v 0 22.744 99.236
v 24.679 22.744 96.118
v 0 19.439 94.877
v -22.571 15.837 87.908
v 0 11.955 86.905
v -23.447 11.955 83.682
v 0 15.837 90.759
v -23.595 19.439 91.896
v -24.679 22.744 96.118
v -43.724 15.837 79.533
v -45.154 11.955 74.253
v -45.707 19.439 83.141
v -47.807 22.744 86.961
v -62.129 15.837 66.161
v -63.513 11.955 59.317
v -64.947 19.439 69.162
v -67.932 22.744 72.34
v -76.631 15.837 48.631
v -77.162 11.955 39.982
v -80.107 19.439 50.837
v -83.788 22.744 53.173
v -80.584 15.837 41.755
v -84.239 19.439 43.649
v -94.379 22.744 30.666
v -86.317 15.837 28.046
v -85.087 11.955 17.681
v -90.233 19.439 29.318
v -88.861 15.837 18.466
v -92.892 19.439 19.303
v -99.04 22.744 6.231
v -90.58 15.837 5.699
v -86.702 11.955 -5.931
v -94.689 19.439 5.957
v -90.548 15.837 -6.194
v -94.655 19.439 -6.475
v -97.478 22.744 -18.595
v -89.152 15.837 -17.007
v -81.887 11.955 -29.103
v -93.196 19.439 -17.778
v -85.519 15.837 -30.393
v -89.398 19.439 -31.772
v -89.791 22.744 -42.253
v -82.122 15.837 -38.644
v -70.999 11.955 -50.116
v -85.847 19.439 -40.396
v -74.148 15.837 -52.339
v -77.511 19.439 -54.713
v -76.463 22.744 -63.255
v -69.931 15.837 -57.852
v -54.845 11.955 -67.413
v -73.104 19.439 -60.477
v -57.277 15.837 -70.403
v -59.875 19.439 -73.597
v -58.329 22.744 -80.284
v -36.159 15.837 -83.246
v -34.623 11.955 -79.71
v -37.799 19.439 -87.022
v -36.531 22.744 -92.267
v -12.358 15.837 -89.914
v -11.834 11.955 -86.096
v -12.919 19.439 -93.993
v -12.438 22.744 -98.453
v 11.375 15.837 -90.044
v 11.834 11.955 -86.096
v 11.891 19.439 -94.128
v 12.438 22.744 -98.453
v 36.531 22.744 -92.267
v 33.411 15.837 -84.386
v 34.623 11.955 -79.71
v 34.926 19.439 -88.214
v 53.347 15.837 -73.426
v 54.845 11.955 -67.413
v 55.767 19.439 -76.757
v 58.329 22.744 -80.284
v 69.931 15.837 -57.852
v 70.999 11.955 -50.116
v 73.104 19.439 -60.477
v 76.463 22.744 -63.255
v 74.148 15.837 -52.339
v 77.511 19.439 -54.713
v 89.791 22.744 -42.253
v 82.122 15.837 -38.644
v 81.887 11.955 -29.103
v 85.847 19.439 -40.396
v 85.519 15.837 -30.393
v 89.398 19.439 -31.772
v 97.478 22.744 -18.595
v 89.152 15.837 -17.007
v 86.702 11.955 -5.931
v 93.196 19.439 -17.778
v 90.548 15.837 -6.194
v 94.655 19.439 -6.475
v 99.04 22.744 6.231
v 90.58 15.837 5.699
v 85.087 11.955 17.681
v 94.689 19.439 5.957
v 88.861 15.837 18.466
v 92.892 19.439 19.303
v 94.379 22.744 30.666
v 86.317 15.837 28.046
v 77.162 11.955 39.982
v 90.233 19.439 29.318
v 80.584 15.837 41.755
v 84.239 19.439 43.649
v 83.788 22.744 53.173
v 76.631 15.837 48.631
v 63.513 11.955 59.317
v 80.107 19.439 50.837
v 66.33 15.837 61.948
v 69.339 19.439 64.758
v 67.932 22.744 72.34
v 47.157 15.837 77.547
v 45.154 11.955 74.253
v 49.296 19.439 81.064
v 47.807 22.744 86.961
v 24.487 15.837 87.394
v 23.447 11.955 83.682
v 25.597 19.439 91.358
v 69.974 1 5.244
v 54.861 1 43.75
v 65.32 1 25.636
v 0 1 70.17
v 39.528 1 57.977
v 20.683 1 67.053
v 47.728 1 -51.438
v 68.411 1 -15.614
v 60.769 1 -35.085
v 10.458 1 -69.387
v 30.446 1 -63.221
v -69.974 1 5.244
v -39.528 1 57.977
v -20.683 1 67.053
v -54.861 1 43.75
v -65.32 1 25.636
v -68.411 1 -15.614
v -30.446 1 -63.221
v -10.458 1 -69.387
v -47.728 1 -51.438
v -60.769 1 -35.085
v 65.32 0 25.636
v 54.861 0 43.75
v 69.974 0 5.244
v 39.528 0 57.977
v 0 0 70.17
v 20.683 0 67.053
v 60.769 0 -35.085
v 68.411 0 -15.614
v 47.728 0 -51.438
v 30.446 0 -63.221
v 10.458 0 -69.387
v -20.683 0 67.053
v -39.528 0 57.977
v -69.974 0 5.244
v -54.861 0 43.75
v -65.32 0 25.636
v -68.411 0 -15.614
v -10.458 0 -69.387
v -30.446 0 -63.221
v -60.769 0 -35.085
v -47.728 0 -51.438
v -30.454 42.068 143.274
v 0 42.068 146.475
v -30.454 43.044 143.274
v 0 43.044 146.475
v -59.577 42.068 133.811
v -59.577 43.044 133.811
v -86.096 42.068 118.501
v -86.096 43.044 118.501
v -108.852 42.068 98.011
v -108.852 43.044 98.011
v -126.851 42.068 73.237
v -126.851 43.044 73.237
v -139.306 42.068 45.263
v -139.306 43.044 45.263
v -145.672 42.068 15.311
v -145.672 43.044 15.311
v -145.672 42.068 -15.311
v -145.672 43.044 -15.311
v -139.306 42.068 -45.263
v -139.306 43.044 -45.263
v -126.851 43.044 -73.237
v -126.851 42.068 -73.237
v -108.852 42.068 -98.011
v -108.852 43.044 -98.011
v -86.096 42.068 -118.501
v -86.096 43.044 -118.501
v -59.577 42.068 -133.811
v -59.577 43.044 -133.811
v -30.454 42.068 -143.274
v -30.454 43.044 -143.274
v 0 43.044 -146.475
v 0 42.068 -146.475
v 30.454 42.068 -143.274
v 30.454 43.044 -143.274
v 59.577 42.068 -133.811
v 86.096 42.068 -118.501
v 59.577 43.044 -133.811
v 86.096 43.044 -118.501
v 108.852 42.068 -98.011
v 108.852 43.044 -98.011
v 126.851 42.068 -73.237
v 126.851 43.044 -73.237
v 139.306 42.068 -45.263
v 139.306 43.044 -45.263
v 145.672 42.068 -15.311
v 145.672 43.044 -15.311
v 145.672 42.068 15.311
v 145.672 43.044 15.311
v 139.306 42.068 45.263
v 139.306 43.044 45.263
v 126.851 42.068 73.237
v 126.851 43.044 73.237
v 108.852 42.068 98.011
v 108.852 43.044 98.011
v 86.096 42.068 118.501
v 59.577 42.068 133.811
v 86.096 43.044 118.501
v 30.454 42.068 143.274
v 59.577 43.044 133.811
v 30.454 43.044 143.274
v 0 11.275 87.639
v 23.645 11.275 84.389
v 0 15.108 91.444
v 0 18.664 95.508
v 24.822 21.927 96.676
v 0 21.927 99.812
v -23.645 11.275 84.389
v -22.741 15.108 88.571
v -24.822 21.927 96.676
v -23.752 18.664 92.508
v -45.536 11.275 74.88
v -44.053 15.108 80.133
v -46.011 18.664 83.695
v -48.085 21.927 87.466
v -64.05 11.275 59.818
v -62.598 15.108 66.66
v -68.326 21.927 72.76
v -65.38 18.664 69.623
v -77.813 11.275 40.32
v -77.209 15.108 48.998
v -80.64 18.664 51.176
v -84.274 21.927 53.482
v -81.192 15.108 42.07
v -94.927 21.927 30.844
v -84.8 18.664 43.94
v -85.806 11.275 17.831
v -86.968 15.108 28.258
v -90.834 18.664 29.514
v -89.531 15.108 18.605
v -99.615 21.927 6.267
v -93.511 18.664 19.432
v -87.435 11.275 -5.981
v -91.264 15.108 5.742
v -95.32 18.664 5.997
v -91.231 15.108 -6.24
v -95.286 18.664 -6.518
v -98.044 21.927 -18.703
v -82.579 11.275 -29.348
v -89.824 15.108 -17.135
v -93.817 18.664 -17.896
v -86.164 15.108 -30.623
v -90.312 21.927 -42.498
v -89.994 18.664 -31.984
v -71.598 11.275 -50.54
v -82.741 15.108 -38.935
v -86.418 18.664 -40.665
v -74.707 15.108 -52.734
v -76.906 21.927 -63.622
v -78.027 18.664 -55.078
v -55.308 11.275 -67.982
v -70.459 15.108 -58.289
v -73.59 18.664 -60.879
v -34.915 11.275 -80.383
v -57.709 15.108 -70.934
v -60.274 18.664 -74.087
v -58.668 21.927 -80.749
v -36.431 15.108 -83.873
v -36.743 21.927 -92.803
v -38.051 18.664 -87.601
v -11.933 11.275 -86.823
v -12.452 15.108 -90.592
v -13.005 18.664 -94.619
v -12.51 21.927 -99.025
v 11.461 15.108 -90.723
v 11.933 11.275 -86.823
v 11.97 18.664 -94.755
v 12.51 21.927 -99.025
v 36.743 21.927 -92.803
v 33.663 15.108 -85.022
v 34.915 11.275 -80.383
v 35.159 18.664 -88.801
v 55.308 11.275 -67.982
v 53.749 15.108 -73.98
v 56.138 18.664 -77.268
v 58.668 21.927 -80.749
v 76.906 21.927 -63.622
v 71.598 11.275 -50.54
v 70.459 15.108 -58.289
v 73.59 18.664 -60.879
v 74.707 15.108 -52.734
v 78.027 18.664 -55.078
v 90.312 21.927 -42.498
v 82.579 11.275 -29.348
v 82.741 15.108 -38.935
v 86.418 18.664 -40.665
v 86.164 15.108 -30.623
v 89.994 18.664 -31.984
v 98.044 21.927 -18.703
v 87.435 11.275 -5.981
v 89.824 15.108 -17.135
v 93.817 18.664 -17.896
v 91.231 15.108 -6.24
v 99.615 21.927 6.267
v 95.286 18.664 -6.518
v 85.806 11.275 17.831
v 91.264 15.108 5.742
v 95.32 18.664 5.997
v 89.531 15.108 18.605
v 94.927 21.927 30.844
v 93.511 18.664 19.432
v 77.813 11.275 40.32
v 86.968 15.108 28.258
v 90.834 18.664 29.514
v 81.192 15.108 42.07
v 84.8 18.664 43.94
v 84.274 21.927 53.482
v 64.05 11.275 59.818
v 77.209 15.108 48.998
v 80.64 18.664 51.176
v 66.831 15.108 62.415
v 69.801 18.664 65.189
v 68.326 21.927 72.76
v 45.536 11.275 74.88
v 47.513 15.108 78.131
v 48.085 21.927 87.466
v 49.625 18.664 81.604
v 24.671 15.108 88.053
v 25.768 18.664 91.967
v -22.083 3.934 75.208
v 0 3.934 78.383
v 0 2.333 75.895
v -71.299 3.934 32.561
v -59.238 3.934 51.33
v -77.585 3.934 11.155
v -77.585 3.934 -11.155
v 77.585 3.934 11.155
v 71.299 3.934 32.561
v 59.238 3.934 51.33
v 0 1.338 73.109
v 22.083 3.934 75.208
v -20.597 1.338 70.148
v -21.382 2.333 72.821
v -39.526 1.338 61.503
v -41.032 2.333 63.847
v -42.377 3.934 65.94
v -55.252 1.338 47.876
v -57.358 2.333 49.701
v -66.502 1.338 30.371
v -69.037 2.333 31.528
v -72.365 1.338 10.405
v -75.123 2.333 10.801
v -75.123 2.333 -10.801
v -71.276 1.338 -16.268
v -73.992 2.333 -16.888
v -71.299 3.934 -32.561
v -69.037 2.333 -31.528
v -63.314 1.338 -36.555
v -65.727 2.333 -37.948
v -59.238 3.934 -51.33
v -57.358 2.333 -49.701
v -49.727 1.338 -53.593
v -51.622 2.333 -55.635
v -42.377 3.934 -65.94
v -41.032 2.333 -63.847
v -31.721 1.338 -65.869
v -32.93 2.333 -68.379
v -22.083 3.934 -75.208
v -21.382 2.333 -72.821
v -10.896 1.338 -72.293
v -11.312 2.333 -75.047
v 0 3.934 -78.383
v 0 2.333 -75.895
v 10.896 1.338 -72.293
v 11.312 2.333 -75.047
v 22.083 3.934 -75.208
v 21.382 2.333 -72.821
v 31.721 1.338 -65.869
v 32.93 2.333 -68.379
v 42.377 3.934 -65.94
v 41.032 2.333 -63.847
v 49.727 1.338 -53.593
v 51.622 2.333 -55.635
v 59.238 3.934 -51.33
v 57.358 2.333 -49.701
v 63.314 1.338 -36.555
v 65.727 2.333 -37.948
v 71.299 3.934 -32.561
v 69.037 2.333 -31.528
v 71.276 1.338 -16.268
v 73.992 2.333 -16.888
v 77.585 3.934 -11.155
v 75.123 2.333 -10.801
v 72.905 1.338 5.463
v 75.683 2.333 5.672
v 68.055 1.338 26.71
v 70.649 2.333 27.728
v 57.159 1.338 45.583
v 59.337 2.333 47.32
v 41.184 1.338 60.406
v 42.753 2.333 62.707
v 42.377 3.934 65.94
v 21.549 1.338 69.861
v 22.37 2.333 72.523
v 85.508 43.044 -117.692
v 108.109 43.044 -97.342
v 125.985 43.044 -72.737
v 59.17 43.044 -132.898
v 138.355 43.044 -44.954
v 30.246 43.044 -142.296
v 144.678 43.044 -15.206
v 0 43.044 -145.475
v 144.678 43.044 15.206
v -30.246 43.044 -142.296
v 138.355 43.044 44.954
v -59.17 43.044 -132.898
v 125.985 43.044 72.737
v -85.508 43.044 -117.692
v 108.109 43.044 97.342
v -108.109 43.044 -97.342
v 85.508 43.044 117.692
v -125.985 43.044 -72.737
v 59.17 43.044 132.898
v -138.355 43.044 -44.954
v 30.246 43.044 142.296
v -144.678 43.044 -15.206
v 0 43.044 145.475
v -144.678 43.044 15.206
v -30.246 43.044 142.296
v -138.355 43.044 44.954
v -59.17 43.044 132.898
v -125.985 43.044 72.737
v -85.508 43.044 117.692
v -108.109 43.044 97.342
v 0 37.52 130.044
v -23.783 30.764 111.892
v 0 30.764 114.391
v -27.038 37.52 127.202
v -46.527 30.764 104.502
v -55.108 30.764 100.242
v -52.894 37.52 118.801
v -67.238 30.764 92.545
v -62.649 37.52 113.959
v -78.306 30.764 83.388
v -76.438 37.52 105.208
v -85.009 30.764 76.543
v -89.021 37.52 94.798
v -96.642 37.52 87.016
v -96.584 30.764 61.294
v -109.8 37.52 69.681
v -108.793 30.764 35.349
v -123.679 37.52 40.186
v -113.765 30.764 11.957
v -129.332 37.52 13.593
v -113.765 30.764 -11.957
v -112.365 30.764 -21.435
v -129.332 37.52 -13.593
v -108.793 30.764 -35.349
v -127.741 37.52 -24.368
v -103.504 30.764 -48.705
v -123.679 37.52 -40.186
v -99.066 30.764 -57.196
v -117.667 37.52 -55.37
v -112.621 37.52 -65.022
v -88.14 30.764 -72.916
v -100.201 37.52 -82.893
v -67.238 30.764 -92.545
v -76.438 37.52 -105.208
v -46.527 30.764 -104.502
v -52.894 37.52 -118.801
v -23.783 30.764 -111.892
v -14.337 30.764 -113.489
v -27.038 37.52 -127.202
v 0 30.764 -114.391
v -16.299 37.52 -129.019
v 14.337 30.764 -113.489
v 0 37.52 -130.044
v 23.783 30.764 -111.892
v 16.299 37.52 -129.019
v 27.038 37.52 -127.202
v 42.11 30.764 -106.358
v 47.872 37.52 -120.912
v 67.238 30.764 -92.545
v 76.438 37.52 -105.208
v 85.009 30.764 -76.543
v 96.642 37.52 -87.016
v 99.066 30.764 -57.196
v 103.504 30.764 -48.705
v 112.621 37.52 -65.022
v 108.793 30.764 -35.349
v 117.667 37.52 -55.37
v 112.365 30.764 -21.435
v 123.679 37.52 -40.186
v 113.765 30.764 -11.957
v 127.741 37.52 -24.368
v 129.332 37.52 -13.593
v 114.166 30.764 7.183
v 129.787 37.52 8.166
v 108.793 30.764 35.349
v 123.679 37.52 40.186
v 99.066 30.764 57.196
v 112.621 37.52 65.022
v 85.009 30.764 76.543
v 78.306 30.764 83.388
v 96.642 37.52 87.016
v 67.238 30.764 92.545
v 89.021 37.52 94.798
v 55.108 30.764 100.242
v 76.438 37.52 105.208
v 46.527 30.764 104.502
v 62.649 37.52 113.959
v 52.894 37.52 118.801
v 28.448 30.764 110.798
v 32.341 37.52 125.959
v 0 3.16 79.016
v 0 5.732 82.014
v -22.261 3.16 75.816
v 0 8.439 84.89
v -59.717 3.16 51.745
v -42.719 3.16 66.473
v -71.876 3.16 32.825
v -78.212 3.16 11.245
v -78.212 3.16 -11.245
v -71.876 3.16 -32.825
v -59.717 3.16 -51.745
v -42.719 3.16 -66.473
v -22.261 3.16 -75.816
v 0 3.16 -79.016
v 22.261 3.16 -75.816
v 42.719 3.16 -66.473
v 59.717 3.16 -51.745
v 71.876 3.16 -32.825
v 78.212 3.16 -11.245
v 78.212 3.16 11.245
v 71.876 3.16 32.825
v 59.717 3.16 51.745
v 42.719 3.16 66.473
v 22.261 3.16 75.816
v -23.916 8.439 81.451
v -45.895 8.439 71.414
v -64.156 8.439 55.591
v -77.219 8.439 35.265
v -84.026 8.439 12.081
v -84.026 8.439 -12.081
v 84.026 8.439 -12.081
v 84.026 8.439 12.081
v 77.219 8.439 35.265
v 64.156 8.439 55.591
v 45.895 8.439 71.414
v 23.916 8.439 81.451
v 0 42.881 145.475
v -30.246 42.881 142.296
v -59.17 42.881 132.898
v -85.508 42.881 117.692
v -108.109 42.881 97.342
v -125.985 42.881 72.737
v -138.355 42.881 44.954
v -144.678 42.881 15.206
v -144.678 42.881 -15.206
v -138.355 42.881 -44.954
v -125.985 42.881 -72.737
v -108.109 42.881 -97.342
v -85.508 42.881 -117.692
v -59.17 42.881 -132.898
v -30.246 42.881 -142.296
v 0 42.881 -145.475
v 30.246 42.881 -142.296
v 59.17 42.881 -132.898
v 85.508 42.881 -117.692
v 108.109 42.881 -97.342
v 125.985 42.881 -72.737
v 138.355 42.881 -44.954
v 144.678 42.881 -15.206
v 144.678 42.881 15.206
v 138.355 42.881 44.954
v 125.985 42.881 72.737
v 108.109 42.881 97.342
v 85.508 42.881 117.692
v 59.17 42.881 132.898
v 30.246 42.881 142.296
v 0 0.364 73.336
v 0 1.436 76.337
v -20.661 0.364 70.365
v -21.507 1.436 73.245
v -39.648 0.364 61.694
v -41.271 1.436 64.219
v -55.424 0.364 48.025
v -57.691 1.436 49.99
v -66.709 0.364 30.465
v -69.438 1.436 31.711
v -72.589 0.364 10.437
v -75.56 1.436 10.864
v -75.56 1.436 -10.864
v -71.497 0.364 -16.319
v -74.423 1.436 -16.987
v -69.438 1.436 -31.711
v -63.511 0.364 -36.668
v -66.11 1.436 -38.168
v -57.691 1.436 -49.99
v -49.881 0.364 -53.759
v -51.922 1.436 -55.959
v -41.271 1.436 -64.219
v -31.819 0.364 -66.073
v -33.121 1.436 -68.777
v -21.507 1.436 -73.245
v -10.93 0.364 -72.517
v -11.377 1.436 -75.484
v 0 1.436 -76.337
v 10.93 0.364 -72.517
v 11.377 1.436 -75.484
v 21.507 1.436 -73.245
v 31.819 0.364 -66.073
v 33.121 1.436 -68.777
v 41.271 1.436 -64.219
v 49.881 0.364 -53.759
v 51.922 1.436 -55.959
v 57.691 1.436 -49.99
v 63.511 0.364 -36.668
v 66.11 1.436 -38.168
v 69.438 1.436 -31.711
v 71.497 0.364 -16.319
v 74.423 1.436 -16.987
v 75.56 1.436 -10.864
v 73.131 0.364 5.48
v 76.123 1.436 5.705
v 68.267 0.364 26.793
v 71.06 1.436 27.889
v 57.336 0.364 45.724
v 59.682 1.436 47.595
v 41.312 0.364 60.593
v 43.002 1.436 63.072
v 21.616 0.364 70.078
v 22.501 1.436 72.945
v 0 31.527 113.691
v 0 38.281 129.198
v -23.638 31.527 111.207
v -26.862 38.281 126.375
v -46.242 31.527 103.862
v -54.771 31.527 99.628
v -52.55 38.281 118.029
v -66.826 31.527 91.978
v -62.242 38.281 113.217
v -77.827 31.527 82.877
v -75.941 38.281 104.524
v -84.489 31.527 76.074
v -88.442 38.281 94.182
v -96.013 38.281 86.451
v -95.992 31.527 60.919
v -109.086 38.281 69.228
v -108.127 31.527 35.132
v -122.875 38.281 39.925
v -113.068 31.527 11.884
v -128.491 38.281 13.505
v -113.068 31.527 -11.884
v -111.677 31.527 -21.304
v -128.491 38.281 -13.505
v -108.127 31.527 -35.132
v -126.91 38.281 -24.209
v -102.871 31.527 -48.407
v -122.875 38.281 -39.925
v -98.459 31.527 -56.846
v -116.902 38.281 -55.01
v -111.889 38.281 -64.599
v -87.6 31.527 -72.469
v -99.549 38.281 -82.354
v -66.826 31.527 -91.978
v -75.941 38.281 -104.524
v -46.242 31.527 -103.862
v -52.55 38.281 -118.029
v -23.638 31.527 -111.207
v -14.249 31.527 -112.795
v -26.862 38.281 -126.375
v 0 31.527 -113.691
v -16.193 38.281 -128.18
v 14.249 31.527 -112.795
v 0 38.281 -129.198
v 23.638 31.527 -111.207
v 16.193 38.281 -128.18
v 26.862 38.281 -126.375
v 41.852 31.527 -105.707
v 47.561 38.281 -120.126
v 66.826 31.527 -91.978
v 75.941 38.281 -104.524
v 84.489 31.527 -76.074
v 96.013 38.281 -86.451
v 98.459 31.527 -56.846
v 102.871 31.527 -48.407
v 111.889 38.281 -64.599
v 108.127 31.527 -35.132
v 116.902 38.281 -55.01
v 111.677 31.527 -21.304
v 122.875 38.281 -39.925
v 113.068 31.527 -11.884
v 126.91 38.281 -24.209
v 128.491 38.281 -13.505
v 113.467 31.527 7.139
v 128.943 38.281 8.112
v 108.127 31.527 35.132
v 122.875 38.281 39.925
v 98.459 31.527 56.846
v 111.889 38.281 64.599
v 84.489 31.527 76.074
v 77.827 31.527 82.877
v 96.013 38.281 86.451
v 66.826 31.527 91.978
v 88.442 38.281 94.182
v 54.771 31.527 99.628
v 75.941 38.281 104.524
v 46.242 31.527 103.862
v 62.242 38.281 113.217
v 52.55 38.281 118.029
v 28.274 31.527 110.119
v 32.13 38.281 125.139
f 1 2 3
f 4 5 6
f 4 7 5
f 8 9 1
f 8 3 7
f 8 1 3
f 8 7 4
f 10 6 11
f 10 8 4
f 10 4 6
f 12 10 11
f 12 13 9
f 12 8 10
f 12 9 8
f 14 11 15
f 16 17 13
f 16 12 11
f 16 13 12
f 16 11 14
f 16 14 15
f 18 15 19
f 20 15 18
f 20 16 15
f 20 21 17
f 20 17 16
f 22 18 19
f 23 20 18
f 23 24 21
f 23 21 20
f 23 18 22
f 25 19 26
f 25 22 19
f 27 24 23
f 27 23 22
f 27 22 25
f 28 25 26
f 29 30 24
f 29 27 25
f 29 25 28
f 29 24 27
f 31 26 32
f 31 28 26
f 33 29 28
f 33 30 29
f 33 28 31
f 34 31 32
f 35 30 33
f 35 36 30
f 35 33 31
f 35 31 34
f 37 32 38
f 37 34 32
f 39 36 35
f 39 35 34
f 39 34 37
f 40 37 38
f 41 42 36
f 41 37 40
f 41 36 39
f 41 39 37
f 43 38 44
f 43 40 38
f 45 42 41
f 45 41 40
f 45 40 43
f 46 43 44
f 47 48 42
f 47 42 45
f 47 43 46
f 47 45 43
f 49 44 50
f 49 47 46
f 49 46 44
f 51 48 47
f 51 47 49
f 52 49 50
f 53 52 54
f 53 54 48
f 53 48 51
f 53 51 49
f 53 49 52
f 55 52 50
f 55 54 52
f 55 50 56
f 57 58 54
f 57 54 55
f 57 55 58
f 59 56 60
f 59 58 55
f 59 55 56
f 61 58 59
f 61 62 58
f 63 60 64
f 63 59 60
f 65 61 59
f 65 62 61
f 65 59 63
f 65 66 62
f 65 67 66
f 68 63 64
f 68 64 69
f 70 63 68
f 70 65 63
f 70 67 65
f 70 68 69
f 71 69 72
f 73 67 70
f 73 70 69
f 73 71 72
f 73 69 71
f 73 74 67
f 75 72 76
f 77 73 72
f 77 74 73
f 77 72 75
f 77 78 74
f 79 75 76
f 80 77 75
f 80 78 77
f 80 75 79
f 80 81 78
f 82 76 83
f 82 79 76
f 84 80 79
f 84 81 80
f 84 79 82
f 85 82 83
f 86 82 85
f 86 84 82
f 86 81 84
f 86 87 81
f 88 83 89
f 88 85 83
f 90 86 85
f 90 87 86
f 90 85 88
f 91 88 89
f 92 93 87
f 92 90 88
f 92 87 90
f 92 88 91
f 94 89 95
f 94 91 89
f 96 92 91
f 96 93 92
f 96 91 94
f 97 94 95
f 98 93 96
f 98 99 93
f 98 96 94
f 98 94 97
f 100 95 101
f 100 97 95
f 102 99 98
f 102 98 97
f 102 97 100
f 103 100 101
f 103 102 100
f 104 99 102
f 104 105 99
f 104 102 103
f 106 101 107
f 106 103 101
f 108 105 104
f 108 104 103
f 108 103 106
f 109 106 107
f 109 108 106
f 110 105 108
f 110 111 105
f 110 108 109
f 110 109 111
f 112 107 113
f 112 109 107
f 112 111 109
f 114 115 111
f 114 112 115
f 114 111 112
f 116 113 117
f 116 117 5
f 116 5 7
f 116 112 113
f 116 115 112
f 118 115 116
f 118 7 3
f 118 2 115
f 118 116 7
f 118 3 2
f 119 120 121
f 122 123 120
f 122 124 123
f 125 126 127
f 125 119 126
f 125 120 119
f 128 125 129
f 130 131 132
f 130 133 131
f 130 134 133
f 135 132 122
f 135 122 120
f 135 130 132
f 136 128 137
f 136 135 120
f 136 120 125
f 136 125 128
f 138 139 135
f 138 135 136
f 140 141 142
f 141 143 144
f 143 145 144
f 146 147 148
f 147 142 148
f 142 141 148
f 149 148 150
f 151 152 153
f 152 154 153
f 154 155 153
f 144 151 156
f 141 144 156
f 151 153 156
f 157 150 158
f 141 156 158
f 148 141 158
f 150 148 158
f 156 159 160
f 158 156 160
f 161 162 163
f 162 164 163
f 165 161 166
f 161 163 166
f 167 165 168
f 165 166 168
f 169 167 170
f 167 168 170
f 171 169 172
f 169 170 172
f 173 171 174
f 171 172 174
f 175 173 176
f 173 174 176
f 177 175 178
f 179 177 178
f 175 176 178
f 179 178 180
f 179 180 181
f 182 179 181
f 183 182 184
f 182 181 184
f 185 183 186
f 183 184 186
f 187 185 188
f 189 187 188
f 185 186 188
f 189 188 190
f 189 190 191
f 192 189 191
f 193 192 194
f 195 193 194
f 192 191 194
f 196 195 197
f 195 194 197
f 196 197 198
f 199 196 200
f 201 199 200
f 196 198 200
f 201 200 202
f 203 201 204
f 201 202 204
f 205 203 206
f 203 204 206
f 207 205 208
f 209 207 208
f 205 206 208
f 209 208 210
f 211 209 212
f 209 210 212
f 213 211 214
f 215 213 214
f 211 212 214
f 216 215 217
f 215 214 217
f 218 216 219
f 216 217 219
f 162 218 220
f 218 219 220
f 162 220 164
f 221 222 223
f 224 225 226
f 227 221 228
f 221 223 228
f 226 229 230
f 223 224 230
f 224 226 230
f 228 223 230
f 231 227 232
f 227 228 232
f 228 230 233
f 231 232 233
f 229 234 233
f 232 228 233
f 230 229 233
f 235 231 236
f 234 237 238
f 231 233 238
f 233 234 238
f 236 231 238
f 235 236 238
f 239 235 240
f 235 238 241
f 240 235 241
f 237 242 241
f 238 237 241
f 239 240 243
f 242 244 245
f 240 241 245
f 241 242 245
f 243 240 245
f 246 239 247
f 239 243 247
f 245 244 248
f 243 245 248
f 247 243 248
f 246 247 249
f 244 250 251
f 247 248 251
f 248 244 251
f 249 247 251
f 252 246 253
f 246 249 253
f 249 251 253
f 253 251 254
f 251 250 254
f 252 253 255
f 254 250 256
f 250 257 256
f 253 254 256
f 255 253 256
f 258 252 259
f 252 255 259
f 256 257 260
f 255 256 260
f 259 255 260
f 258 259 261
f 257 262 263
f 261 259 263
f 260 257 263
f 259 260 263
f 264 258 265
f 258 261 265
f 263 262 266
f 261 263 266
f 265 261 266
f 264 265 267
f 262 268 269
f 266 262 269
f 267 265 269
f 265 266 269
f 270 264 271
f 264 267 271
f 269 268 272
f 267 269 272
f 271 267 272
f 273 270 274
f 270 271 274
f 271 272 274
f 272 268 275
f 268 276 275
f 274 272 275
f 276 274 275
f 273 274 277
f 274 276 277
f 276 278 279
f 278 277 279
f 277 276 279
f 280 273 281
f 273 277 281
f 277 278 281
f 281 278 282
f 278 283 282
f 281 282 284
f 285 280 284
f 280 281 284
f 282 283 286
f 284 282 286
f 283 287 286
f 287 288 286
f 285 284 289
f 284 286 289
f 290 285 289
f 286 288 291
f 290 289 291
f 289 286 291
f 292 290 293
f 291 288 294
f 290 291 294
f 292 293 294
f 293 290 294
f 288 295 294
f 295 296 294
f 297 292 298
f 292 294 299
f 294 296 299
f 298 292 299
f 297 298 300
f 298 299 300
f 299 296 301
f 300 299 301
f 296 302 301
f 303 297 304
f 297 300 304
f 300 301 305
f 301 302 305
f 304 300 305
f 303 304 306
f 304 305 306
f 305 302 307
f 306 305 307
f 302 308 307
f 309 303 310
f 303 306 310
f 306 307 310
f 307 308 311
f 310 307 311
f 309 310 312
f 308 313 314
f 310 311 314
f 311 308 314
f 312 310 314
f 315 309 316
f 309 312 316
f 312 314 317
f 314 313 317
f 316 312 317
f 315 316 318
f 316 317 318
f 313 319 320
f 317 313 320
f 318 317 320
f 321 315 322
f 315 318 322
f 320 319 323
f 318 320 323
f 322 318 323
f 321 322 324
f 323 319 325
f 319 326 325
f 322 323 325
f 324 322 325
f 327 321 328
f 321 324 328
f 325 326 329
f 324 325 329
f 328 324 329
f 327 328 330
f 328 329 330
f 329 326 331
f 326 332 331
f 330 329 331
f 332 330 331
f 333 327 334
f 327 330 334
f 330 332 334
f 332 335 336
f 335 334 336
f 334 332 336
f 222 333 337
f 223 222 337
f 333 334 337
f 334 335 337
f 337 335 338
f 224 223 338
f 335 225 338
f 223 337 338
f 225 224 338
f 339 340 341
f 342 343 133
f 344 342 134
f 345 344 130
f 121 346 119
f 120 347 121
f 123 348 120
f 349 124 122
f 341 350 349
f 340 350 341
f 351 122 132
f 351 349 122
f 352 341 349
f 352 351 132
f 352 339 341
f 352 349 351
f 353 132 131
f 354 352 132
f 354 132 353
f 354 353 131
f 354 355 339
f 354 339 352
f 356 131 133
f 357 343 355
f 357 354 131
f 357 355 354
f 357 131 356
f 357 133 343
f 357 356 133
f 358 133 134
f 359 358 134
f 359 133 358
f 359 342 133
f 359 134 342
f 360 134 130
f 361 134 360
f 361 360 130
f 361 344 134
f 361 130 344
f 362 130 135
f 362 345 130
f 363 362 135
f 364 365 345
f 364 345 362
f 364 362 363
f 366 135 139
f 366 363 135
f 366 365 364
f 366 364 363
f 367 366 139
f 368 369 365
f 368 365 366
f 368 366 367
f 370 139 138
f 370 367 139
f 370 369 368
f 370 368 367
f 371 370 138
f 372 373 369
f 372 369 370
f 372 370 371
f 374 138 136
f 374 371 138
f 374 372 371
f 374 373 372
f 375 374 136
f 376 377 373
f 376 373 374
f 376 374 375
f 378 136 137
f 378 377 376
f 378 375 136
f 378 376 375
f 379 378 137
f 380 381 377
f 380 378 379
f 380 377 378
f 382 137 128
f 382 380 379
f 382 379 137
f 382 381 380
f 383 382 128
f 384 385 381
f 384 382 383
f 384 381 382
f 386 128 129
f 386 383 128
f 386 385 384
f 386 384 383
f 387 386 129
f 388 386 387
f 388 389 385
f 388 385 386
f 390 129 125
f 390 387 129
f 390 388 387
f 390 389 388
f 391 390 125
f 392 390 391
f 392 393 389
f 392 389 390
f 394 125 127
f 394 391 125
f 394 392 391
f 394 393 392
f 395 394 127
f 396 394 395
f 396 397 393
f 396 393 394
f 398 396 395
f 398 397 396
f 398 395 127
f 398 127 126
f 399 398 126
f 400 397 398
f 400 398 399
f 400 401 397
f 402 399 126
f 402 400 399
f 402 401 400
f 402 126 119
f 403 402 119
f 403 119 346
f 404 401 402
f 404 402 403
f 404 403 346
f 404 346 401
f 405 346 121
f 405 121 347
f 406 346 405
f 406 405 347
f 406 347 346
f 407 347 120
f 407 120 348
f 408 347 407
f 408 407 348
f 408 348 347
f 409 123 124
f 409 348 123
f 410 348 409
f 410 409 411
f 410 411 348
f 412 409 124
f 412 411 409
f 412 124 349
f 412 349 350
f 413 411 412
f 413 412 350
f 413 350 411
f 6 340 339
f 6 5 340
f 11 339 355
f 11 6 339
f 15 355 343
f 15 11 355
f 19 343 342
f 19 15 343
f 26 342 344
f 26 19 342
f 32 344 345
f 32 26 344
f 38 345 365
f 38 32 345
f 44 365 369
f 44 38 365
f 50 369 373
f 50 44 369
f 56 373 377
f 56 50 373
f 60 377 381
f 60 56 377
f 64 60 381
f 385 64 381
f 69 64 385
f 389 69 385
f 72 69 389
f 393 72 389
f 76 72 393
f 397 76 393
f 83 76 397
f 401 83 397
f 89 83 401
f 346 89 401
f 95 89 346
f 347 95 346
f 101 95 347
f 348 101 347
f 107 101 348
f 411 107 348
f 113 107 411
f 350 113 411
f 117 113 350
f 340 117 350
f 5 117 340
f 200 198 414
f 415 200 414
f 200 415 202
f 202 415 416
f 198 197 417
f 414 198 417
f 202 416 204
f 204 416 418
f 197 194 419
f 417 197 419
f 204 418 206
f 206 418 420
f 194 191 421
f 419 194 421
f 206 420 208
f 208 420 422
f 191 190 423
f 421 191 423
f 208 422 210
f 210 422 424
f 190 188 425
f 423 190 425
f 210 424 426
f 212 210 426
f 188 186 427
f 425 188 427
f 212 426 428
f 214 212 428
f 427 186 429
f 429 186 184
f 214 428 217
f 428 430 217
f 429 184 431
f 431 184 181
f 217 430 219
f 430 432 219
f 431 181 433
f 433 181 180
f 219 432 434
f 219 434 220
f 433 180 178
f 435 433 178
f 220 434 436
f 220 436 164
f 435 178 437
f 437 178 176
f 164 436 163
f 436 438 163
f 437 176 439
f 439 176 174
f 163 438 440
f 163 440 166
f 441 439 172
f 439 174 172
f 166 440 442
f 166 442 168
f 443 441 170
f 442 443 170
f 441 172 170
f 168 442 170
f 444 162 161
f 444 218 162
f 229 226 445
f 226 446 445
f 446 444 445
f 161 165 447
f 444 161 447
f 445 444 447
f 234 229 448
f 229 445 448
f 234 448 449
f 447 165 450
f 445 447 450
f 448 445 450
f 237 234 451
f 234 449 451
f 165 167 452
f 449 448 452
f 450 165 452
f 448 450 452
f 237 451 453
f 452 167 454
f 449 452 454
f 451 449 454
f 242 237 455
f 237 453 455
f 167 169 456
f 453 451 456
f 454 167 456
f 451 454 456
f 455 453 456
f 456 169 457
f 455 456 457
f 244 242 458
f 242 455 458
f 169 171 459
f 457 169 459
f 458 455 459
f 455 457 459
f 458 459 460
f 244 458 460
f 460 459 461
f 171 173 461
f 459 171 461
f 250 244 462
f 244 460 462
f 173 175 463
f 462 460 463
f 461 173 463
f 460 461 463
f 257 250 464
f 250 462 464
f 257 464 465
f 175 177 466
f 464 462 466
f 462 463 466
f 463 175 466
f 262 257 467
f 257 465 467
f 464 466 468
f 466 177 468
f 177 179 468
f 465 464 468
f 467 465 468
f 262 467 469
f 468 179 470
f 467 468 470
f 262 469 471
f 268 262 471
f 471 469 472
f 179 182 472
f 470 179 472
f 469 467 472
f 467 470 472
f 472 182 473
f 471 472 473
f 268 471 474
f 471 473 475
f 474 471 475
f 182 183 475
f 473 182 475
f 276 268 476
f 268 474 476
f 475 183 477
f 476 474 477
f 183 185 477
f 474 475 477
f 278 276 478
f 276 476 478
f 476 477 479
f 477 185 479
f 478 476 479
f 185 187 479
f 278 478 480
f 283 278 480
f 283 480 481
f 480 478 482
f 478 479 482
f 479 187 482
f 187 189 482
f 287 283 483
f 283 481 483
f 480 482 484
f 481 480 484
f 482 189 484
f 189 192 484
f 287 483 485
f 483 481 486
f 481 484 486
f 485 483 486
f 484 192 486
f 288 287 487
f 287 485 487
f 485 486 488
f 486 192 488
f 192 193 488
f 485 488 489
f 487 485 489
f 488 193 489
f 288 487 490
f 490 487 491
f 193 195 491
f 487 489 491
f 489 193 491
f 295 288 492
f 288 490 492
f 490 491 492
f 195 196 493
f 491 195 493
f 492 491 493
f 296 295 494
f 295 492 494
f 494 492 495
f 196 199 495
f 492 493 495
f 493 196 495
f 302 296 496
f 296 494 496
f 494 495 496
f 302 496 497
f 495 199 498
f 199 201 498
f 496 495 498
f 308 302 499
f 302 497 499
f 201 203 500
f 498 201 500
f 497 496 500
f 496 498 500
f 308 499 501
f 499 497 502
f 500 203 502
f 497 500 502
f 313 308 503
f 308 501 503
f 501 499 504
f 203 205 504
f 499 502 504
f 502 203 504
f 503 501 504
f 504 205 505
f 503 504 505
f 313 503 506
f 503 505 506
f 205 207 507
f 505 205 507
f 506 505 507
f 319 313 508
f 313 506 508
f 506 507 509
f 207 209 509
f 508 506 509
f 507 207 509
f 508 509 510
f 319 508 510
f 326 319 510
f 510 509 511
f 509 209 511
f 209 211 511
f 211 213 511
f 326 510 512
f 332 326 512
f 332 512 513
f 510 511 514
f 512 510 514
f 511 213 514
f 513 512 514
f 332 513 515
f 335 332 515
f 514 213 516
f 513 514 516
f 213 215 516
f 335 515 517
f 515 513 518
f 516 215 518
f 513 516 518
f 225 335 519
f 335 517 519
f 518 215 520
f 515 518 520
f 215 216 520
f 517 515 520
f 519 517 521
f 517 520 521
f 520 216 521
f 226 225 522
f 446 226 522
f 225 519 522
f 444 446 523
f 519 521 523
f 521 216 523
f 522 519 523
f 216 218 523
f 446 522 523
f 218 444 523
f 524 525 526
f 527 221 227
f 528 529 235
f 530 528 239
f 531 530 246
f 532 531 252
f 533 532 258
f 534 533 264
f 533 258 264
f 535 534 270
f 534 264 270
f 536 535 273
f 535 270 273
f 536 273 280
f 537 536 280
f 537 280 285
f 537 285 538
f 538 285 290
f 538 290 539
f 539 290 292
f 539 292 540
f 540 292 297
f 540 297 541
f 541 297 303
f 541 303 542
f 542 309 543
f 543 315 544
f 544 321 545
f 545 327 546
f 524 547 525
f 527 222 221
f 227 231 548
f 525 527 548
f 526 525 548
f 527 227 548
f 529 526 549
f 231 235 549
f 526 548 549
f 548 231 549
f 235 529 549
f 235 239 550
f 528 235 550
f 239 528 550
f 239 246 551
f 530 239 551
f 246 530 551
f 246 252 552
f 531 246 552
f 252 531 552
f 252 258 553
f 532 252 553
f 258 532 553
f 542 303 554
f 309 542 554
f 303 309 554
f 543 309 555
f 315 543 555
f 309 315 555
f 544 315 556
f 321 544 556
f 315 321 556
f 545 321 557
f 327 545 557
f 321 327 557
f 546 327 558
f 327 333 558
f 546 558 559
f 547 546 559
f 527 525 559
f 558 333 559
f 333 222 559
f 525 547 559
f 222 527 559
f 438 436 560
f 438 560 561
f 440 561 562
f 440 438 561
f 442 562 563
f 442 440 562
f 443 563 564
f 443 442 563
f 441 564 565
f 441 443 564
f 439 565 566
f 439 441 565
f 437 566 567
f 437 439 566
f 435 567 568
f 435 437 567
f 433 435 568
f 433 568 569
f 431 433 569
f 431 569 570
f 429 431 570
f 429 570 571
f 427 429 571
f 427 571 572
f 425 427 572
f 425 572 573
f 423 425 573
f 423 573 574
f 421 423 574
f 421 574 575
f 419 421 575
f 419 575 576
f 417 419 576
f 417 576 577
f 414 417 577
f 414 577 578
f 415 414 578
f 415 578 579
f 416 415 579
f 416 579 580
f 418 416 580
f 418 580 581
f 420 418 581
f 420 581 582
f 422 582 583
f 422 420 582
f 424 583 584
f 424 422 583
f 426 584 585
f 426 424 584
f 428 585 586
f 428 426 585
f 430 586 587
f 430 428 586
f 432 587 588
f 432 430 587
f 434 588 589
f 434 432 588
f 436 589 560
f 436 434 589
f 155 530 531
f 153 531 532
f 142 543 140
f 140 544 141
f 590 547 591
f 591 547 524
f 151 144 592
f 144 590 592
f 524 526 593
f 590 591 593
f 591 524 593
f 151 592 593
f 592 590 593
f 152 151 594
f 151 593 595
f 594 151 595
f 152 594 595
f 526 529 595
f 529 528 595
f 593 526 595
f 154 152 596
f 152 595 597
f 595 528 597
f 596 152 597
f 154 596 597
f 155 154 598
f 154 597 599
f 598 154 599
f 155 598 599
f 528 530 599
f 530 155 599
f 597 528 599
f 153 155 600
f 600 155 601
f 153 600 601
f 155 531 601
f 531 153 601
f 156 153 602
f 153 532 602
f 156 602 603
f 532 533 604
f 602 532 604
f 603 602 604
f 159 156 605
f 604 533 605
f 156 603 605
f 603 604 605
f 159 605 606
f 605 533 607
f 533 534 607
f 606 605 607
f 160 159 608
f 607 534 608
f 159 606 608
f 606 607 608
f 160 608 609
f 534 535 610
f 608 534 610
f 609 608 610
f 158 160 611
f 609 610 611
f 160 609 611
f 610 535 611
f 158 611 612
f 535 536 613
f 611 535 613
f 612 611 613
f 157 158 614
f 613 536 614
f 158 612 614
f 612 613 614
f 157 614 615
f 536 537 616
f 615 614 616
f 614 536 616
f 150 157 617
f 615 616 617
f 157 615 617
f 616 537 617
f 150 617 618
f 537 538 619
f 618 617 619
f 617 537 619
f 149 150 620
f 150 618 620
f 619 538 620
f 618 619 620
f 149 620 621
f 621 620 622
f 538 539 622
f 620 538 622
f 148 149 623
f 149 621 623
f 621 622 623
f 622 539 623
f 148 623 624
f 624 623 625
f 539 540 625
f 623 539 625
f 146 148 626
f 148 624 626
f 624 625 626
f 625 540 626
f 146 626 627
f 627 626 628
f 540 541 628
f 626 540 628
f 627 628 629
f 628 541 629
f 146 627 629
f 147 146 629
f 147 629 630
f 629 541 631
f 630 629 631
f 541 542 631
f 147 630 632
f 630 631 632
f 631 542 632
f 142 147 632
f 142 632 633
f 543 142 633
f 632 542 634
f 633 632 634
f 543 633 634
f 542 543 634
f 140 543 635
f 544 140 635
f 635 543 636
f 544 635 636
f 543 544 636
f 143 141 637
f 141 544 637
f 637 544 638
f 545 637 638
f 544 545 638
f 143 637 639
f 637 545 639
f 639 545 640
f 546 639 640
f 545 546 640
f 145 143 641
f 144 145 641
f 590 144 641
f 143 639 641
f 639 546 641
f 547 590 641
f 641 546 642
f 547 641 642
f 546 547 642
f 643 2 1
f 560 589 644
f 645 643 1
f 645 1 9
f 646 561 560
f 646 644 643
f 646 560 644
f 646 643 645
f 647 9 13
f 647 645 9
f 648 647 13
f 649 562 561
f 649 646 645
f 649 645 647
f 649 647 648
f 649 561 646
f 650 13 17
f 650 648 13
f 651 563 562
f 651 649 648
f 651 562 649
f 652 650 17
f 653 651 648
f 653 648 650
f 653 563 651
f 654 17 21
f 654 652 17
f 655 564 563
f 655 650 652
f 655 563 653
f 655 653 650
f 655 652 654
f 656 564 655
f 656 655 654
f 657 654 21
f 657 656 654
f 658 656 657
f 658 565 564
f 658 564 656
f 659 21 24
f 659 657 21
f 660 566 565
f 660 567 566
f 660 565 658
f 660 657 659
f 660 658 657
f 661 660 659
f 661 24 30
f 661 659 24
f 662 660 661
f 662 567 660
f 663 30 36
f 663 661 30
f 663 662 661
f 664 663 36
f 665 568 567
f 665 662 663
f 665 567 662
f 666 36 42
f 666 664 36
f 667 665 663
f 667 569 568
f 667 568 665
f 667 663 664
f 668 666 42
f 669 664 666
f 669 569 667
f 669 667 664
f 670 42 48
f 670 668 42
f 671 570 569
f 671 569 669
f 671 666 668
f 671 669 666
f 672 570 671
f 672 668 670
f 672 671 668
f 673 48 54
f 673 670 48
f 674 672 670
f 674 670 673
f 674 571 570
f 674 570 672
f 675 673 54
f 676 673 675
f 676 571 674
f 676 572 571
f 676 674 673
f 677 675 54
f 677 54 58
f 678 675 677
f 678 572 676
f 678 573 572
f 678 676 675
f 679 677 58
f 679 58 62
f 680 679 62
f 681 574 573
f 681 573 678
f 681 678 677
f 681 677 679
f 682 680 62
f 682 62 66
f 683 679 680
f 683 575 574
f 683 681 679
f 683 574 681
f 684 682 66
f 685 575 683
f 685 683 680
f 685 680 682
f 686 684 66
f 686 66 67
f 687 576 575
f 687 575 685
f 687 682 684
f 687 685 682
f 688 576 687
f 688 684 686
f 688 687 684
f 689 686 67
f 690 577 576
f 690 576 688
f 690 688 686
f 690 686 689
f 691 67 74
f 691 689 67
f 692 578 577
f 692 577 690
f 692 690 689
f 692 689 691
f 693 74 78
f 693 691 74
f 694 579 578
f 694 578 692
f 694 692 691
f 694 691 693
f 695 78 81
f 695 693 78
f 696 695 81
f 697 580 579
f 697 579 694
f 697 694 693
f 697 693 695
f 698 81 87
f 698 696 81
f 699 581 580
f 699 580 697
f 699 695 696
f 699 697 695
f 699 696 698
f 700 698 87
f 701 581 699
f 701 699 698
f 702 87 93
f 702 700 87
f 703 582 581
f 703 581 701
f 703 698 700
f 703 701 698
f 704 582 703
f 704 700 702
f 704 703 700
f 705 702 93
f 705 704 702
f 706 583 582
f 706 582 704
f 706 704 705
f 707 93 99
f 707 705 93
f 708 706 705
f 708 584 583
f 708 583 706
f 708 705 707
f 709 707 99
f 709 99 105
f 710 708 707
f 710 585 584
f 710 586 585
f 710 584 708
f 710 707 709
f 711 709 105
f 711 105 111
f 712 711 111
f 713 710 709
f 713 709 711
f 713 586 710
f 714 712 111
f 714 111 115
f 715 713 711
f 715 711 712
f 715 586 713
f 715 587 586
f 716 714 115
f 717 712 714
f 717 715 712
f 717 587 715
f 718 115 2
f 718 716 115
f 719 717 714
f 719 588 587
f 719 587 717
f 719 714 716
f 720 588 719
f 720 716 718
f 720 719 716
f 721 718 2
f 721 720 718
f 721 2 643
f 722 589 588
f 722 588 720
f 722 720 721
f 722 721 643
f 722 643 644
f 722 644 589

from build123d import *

# Parameters (mm, degrees)
SHELL2_T = -1


with BuildPart() as part:
    # Sketch1 → Revolve3 (revolve)
    with BuildSketch(Plane.XY, mode=Mode.PRIVATE) as revolve3_sk:
        with BuildLine():
            Line((0, 0), (70.170274015, 0))
            ThreePointArc((70.170274015, 0), (74.867019818, 0.813696051), (79.016316154, 3.159940352))
            ThreePointArc((79.016316154, 3.159940352), (83.467476244, 7.068955028), (87.638838201, 11.275255219))
            ThreePointArc((87.638838201, 11.275255219), (93.444928024, 16.921383546), (99.811810502, 21.926605983))
            ThreePointArc((99.811810502, 21.926605983), (122.101594507, 34.410654829), (146.474870989, 42.06763466))
            Line((146.474870989, 42.06763466), (146.474870989, 43.043574036))
            Line((146.474870989, 43.043574036), (0, 43.043574036))
            Line((0, 43.043574036), (0, 0))
        make_face()
    revolve(revolve3_sk.sketch.rotate(Axis((0, 43.043574036, 0), (0, -1, 0)), 90), axis=Axis((0, 43.043574036, 0), (0, -1, 0)))

    # Shell2
    shell2_openings = [part.faces().sort_by_distance(p)[0] for p in [
        (0, 43.043574036, 0),
    ]]
    offset(amount=SHELL2_T, openings=shell2_openings, kind=Kind.INTERSECTION)


solid = part.part
